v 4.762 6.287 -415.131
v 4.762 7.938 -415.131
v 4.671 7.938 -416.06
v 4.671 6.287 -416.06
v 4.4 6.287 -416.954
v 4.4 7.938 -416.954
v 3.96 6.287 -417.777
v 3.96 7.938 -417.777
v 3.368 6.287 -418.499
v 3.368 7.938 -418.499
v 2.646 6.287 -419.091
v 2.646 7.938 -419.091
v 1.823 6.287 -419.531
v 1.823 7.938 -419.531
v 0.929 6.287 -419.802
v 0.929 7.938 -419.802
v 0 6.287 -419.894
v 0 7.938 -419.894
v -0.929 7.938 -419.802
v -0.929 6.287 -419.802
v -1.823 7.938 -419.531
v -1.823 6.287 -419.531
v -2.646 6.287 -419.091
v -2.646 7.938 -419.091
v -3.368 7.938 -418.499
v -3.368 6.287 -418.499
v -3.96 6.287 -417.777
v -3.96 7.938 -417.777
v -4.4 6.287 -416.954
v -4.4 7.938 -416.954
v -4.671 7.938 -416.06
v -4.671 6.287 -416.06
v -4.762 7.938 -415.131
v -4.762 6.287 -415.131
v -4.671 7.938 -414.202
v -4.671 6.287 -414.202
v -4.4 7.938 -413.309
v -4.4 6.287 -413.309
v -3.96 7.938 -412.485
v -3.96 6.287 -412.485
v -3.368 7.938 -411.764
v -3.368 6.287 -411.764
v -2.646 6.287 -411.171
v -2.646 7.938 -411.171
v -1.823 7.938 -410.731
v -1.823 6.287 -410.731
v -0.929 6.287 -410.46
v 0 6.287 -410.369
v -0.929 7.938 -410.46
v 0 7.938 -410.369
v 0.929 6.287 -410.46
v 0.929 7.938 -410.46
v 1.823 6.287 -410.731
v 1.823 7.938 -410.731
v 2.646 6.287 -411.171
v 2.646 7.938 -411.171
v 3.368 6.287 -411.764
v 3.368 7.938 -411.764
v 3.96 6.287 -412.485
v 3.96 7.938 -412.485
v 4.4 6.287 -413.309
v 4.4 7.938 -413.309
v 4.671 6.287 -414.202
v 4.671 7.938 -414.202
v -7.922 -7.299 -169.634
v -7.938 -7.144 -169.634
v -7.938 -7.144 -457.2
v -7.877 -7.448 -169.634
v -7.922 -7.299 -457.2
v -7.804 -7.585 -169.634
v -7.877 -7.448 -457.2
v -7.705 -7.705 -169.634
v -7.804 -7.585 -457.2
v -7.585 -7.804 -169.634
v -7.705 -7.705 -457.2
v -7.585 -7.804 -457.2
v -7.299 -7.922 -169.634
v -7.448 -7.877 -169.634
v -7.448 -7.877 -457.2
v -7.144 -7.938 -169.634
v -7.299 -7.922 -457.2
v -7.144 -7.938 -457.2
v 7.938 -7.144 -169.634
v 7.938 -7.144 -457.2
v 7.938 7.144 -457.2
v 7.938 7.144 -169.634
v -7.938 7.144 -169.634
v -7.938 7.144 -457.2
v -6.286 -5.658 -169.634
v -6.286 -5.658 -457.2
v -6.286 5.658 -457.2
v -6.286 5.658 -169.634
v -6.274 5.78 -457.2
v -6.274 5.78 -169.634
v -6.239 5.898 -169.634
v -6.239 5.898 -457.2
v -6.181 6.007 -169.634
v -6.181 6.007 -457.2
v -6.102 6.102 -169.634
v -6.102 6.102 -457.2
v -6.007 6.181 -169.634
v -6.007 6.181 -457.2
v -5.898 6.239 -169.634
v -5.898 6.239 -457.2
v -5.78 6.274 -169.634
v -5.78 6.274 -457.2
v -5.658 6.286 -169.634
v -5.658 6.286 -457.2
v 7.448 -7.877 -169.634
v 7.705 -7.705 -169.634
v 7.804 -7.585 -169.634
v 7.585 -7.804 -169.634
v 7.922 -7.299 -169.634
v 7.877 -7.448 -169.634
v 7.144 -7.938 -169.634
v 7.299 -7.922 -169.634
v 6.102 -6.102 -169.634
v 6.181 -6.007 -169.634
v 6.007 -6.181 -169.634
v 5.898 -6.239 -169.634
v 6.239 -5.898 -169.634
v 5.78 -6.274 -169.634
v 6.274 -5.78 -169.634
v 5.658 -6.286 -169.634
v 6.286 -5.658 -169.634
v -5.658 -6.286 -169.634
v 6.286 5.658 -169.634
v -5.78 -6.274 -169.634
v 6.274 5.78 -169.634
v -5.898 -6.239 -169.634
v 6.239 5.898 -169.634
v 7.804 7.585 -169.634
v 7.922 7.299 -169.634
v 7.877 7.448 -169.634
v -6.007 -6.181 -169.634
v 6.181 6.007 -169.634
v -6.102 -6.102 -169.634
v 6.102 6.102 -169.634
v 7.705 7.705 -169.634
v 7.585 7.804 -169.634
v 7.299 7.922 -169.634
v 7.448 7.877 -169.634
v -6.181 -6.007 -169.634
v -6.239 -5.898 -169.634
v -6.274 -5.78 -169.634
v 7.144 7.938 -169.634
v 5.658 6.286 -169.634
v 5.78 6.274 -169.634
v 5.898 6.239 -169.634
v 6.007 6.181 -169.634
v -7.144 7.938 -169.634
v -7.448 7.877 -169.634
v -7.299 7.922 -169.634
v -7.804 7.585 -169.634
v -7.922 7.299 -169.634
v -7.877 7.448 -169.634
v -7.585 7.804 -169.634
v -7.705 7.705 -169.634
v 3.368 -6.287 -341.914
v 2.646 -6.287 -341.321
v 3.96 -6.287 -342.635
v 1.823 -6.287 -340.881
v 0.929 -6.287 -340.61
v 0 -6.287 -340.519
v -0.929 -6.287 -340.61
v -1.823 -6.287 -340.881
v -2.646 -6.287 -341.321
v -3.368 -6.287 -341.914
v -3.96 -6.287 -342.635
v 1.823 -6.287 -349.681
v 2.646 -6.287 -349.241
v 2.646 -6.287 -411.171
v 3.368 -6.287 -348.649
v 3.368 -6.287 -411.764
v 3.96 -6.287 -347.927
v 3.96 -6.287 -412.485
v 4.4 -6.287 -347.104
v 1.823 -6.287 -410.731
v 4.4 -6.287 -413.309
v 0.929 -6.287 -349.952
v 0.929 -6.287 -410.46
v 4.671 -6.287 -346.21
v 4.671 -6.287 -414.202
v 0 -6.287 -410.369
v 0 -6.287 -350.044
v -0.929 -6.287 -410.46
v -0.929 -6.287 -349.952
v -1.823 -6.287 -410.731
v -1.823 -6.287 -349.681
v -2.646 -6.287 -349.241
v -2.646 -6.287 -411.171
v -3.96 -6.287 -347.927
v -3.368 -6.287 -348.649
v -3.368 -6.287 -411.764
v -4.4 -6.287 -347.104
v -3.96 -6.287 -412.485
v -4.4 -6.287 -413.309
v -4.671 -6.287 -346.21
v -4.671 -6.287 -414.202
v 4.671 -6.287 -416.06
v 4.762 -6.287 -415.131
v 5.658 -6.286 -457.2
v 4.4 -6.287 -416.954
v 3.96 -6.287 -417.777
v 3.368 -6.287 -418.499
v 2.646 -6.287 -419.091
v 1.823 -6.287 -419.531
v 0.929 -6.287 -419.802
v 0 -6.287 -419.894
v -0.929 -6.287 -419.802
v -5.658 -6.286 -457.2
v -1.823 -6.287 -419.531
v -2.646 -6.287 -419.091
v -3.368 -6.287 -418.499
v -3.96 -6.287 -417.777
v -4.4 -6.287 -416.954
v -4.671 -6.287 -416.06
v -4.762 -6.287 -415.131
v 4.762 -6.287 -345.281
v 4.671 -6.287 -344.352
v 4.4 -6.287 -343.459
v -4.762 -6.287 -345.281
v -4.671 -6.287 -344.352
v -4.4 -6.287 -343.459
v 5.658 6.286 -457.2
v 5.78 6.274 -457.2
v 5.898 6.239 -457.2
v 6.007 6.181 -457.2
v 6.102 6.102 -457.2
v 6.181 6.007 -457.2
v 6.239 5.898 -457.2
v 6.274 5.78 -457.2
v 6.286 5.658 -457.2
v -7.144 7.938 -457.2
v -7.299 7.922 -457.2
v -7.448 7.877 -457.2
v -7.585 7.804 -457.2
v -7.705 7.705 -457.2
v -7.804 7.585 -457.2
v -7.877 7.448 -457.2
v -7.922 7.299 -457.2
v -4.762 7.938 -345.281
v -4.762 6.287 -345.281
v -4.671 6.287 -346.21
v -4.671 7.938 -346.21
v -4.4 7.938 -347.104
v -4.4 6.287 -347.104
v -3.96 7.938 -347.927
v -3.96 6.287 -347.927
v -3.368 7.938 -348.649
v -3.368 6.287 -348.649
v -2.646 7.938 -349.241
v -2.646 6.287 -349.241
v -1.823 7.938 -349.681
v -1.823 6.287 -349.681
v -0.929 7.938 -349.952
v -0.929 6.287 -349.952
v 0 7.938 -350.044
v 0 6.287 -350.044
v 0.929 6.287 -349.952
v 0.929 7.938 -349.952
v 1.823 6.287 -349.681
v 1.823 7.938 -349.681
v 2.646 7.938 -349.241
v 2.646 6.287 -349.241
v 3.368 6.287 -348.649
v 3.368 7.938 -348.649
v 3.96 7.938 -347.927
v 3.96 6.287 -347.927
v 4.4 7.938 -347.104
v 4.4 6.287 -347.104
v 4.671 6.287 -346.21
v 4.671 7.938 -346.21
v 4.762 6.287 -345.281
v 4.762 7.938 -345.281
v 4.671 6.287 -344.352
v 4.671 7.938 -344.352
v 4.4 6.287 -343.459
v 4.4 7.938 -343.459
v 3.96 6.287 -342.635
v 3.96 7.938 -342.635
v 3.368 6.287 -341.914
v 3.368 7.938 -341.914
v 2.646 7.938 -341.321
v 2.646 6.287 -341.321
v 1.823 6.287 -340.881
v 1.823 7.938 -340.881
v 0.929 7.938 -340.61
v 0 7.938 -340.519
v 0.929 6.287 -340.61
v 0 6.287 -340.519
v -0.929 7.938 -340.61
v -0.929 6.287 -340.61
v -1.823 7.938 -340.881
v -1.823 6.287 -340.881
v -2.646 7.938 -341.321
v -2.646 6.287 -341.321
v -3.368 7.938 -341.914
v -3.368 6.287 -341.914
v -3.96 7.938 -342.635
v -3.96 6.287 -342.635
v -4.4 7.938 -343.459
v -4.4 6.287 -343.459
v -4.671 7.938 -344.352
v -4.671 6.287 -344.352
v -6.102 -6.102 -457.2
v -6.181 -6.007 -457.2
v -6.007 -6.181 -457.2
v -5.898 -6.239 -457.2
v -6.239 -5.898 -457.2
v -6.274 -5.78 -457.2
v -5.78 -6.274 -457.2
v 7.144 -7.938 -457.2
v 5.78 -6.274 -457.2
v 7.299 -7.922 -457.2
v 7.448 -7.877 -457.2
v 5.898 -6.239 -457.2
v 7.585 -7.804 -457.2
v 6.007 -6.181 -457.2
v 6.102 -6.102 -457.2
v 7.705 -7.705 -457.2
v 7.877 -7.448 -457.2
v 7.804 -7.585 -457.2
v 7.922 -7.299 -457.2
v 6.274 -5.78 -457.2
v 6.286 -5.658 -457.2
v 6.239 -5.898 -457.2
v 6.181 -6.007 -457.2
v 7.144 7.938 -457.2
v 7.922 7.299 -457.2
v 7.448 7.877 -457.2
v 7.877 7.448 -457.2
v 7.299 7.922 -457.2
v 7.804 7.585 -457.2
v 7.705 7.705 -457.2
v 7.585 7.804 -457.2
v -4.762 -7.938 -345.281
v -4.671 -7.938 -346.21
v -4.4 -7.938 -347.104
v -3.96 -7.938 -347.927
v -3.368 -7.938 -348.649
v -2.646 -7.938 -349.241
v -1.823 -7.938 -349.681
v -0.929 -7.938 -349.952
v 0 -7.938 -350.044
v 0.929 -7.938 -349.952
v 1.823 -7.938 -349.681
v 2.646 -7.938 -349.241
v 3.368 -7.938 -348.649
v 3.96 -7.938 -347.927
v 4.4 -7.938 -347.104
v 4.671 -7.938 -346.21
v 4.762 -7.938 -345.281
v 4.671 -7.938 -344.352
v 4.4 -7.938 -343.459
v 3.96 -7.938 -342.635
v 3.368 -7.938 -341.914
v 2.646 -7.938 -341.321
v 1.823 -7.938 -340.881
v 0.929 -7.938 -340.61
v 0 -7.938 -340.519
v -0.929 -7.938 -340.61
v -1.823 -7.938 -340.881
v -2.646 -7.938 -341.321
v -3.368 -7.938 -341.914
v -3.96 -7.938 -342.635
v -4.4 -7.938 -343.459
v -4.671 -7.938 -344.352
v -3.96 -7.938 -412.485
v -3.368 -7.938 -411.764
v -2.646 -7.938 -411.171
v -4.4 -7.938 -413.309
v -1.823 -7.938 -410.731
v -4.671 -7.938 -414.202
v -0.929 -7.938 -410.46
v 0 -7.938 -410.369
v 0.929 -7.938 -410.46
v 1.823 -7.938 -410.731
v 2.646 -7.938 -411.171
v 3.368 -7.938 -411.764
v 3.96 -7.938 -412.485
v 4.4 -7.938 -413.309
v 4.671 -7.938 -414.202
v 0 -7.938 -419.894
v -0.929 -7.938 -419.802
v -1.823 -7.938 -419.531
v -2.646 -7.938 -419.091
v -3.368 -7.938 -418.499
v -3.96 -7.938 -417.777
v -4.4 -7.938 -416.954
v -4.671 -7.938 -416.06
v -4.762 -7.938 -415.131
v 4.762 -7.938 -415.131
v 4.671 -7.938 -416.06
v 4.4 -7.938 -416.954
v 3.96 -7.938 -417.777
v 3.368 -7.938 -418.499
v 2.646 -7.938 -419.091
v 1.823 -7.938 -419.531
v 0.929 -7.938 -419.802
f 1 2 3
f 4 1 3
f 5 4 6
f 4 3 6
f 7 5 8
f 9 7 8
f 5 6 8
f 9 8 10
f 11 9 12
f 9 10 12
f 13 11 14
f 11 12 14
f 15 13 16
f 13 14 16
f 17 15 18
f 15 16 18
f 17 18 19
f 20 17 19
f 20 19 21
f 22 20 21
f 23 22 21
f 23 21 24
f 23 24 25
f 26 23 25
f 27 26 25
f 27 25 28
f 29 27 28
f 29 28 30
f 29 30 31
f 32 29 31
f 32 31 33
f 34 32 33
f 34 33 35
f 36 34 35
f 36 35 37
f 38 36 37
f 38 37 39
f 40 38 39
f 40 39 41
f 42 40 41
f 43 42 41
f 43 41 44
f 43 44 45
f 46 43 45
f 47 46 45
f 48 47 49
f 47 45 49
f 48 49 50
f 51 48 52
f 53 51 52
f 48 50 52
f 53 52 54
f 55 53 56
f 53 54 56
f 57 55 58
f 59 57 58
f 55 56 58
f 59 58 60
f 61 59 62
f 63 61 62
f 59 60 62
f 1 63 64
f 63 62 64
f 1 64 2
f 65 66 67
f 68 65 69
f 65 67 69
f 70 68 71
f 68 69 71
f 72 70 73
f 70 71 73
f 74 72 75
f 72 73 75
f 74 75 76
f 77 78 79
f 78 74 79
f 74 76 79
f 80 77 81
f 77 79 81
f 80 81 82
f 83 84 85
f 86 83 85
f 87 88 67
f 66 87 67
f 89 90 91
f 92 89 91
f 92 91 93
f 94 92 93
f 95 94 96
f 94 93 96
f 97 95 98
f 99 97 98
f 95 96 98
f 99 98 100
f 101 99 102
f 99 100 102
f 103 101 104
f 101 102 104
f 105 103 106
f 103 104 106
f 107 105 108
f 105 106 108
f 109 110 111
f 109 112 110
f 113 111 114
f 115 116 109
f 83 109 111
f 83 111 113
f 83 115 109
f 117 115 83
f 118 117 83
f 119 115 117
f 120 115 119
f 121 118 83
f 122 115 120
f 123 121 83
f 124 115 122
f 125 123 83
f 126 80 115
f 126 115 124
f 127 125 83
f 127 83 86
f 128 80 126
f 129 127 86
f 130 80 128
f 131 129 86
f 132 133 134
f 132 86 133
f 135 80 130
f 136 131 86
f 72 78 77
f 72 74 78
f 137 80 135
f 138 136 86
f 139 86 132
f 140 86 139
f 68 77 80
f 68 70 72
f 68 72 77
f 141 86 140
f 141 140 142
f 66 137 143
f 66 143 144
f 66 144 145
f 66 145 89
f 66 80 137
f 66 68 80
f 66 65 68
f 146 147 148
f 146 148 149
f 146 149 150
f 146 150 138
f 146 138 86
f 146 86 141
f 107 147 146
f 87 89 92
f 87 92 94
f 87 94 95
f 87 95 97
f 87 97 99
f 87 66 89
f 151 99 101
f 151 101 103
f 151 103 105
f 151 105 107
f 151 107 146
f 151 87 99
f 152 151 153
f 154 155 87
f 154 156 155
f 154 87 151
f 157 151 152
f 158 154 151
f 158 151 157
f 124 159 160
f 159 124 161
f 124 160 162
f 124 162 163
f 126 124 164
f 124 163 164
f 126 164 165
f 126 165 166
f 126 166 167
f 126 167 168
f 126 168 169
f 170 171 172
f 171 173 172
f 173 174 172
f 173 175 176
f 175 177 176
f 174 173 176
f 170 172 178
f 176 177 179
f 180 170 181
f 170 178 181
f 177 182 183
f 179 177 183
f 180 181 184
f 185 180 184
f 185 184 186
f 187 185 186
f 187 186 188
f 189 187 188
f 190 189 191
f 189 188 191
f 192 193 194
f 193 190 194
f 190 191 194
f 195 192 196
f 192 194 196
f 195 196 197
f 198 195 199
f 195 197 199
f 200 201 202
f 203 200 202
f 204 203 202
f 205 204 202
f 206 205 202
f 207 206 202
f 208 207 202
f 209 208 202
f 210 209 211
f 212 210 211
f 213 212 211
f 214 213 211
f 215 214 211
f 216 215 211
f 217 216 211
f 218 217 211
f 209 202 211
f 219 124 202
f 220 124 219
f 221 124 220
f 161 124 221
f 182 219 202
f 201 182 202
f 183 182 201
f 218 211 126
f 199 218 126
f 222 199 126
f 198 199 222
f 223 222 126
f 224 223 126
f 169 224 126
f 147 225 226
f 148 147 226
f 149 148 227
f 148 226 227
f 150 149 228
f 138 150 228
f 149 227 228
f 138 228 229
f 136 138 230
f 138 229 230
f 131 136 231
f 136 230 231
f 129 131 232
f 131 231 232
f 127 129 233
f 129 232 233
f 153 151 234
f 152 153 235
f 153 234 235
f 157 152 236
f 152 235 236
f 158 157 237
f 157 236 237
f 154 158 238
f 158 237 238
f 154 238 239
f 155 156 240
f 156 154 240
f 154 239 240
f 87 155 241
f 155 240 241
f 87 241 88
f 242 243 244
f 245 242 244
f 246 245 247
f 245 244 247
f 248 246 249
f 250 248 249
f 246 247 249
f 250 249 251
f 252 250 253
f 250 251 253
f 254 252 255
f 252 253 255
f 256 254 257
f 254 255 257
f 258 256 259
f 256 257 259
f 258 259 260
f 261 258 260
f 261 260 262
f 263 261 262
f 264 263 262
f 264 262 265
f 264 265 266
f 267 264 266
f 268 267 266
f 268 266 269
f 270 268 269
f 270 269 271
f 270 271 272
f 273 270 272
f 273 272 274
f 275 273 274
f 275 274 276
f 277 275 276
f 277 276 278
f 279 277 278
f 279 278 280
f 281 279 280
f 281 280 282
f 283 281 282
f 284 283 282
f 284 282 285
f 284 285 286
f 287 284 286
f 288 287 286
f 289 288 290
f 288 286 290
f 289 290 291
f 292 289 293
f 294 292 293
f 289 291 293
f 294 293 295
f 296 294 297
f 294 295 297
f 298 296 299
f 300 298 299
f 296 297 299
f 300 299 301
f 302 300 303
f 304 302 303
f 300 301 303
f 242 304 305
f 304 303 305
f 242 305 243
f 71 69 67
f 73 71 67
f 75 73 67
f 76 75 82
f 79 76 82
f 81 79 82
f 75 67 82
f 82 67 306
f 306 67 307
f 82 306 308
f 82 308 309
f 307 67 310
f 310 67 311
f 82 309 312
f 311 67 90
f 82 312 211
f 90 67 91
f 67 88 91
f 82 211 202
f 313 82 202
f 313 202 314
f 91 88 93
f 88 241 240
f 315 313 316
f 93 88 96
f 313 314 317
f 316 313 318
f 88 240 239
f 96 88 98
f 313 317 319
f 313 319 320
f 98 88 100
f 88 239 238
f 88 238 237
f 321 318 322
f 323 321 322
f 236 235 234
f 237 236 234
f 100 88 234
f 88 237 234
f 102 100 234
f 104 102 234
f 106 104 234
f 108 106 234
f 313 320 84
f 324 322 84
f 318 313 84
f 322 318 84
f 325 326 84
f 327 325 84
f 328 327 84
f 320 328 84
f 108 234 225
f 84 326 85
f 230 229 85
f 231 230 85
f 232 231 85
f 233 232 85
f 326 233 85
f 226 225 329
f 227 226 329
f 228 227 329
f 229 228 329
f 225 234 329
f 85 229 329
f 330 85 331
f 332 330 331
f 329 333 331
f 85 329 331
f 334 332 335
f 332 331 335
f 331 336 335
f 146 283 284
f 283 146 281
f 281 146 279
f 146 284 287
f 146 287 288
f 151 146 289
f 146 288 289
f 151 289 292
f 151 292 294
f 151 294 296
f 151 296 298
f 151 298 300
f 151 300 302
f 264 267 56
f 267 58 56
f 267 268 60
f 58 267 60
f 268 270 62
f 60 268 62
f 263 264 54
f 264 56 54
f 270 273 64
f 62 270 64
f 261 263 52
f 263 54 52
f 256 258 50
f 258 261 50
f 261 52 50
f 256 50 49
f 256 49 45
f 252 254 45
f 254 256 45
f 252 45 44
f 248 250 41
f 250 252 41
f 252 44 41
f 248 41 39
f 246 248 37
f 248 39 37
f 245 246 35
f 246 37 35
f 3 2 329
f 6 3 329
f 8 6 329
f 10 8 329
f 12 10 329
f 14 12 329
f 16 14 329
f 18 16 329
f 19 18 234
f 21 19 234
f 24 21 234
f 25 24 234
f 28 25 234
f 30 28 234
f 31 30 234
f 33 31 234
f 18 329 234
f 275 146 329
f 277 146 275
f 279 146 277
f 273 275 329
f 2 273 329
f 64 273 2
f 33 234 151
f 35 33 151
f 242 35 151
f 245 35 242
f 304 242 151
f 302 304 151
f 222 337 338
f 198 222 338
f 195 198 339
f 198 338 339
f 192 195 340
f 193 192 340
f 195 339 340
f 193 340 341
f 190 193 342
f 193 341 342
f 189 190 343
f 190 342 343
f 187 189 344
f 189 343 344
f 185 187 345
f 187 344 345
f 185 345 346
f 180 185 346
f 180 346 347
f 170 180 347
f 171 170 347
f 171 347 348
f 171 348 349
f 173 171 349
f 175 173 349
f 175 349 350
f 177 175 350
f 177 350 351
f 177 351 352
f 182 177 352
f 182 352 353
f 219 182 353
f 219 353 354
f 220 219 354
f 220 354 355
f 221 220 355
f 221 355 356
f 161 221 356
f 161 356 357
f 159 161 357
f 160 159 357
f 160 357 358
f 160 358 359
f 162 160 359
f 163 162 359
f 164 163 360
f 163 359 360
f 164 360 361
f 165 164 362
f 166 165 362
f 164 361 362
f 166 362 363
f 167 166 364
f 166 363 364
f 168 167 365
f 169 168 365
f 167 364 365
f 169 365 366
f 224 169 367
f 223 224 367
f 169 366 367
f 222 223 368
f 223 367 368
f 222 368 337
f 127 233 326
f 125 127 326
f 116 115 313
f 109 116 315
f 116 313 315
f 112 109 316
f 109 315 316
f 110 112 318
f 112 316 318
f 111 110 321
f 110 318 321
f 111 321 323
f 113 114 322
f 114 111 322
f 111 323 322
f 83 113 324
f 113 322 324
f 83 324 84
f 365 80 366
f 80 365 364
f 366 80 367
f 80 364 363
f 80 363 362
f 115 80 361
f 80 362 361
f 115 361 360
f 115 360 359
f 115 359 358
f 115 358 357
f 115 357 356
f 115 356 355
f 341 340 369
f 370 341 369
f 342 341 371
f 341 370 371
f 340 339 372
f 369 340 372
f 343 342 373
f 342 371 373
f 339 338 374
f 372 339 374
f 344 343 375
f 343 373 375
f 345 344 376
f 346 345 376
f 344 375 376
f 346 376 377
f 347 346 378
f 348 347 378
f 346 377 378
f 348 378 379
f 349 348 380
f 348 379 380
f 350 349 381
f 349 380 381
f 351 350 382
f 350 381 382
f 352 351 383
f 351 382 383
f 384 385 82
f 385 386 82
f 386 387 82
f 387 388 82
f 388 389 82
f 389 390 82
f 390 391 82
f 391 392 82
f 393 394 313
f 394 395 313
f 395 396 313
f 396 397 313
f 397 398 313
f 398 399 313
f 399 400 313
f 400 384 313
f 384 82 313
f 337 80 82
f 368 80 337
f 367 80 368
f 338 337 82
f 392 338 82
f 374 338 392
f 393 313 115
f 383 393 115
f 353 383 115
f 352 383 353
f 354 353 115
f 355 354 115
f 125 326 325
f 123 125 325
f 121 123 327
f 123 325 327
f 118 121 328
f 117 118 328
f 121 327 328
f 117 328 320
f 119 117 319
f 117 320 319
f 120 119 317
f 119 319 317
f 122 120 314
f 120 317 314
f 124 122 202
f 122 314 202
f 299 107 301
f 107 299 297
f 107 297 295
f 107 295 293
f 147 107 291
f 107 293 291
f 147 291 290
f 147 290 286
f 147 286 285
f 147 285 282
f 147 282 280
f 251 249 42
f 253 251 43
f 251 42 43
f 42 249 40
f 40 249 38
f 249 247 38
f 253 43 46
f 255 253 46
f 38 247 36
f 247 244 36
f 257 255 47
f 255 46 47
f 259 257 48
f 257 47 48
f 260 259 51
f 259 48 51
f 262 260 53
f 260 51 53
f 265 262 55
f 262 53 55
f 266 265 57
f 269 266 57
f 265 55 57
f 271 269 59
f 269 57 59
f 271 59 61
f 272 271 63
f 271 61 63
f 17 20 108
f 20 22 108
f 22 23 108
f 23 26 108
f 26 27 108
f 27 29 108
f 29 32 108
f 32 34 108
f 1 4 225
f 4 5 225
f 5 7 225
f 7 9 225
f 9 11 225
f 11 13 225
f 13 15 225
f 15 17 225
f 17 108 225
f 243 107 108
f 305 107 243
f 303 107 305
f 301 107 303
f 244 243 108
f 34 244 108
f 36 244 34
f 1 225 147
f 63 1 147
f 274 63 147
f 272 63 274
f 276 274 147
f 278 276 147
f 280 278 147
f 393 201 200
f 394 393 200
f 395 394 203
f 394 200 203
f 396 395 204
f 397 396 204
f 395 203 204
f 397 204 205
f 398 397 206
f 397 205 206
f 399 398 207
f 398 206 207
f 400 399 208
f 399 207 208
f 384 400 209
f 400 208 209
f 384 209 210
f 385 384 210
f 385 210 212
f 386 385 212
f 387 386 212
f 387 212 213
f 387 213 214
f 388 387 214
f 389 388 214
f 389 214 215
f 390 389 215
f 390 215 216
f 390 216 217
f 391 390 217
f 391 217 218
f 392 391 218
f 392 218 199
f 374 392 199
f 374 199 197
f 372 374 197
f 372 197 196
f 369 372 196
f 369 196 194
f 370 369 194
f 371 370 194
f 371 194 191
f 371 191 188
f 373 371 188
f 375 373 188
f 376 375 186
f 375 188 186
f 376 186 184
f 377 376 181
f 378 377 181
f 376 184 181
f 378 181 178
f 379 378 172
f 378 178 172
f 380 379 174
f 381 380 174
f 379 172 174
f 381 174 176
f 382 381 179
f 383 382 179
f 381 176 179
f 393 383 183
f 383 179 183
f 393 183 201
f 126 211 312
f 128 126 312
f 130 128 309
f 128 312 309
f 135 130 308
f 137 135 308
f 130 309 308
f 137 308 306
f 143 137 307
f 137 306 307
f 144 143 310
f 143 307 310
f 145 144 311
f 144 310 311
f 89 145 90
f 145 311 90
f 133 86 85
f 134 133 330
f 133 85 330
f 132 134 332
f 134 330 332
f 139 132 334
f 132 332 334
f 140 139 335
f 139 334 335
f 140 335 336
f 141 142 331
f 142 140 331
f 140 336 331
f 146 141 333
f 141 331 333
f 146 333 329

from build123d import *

# Parameters (mm, degrees)
BOSS_EXTRUDE1_DEPTH          = 457.2
BOSS_EXTRUDE1_DEPTH_BACK     = 457.2
F_3_8_0_375_DIAMETER_HOLE1_D = 9.525
F_3_8_0_375_DIAMETER_HOLE2_D = 9.525
SKETCH10_W                   = 777.465907107
SKETCH10_H                   = 78.912238835
CUT_EXTRUDE1_DEPTH           = 33.02


with BuildPart() as part:
    # Sketch4 → Boss-Extrude1 (new, two sides: drawn at the far end of the back side and taken through both)
    with BuildSketch(Plane.XY.offset(-BOSS_EXTRUDE1_DEPTH_BACK)):
        with BuildLine():
            Line((7.9375, -7.14375), (7.9375, 7.14375))
            ThreePointArc((7.9375, 7.14375), (7.705016008, 7.705016008), (7.14375, 7.9375))
            Line((7.14375, 7.9375), (-7.14375, 7.9375))
            ThreePointArc((-7.14375, 7.9375), (-7.705016008, 7.705016008), (-7.9375, 7.14375))
            Line((-7.9375, 7.14375), (-7.9375, -7.14375))
            ThreePointArc((-7.9375, -7.14375), (-7.705016008, -7.705016008), (-7.14375, -7.9375))
            Line((-7.14375, -7.9375), (7.14375, -7.9375))
            ThreePointArc((7.14375, -7.9375), (7.705016008, -7.705016008), (7.9375, -7.14375))
        make_face()
        with BuildLine():
            Line((6.2865, 5.65785), (6.2865, -5.65785))
            ThreePointArc((6.2865, -5.65785), (6.102372678, -6.102372678), (5.65785, -6.2865))
            Line((5.65785, -6.2865), (-5.65785, -6.2865))
            ThreePointArc((-5.65785, -6.2865), (-6.102372678, -6.102372678), (-6.2865, -5.65785))
            Line((-6.2865, -5.65785), (-6.2865, 5.65785))
            ThreePointArc((-6.2865, 5.65785), (-6.102372678, 6.102372678), (-5.65785, 6.2865))
            Line((-5.65785, 6.2865), (5.65785, 6.2865))
            ThreePointArc((5.65785, 6.2865), (6.102372678, 6.102372678), (6.2865, 5.65785))
        make_face(mode=Mode.SUBTRACT)
    extrude(amount=BOSS_EXTRUDE1_DEPTH + BOSS_EXTRUDE1_DEPTH_BACK)

    # 3/8 (0.375) Diameter Hole1 (through all)
    with Locations(Plane(origin=(0, -7.9375, 0), x_dir=(-1, 0, 0), z_dir=(0, -1, 0))):
        with Locations((0, 415.13125)):
            Hole(F_3_8_0_375_DIAMETER_HOLE1_D / 2)

    # 3/8 (0.375) Diameter Hole2 (through all)
    with Locations(Plane(origin=(0, 7.9375, 0), x_dir=(1, 0, 0), z_dir=(0, 1, 0))):
        with Locations((0, 345.28125)):
            Hole(F_3_8_0_375_DIAMETER_HOLE2_D / 2)

    # Sketch10 → Cut-Extrude1 (cut)
    with BuildSketch(Plane.ZY.offset(7.9375)):
        with Locations((219.099444852, 1.446775725)):
            Rectangle(SKETCH10_W, SKETCH10_H)
    extrude(amount=-CUT_EXTRUDE1_DEPTH, mode=Mode.SUBTRACT)


solid = part.part
